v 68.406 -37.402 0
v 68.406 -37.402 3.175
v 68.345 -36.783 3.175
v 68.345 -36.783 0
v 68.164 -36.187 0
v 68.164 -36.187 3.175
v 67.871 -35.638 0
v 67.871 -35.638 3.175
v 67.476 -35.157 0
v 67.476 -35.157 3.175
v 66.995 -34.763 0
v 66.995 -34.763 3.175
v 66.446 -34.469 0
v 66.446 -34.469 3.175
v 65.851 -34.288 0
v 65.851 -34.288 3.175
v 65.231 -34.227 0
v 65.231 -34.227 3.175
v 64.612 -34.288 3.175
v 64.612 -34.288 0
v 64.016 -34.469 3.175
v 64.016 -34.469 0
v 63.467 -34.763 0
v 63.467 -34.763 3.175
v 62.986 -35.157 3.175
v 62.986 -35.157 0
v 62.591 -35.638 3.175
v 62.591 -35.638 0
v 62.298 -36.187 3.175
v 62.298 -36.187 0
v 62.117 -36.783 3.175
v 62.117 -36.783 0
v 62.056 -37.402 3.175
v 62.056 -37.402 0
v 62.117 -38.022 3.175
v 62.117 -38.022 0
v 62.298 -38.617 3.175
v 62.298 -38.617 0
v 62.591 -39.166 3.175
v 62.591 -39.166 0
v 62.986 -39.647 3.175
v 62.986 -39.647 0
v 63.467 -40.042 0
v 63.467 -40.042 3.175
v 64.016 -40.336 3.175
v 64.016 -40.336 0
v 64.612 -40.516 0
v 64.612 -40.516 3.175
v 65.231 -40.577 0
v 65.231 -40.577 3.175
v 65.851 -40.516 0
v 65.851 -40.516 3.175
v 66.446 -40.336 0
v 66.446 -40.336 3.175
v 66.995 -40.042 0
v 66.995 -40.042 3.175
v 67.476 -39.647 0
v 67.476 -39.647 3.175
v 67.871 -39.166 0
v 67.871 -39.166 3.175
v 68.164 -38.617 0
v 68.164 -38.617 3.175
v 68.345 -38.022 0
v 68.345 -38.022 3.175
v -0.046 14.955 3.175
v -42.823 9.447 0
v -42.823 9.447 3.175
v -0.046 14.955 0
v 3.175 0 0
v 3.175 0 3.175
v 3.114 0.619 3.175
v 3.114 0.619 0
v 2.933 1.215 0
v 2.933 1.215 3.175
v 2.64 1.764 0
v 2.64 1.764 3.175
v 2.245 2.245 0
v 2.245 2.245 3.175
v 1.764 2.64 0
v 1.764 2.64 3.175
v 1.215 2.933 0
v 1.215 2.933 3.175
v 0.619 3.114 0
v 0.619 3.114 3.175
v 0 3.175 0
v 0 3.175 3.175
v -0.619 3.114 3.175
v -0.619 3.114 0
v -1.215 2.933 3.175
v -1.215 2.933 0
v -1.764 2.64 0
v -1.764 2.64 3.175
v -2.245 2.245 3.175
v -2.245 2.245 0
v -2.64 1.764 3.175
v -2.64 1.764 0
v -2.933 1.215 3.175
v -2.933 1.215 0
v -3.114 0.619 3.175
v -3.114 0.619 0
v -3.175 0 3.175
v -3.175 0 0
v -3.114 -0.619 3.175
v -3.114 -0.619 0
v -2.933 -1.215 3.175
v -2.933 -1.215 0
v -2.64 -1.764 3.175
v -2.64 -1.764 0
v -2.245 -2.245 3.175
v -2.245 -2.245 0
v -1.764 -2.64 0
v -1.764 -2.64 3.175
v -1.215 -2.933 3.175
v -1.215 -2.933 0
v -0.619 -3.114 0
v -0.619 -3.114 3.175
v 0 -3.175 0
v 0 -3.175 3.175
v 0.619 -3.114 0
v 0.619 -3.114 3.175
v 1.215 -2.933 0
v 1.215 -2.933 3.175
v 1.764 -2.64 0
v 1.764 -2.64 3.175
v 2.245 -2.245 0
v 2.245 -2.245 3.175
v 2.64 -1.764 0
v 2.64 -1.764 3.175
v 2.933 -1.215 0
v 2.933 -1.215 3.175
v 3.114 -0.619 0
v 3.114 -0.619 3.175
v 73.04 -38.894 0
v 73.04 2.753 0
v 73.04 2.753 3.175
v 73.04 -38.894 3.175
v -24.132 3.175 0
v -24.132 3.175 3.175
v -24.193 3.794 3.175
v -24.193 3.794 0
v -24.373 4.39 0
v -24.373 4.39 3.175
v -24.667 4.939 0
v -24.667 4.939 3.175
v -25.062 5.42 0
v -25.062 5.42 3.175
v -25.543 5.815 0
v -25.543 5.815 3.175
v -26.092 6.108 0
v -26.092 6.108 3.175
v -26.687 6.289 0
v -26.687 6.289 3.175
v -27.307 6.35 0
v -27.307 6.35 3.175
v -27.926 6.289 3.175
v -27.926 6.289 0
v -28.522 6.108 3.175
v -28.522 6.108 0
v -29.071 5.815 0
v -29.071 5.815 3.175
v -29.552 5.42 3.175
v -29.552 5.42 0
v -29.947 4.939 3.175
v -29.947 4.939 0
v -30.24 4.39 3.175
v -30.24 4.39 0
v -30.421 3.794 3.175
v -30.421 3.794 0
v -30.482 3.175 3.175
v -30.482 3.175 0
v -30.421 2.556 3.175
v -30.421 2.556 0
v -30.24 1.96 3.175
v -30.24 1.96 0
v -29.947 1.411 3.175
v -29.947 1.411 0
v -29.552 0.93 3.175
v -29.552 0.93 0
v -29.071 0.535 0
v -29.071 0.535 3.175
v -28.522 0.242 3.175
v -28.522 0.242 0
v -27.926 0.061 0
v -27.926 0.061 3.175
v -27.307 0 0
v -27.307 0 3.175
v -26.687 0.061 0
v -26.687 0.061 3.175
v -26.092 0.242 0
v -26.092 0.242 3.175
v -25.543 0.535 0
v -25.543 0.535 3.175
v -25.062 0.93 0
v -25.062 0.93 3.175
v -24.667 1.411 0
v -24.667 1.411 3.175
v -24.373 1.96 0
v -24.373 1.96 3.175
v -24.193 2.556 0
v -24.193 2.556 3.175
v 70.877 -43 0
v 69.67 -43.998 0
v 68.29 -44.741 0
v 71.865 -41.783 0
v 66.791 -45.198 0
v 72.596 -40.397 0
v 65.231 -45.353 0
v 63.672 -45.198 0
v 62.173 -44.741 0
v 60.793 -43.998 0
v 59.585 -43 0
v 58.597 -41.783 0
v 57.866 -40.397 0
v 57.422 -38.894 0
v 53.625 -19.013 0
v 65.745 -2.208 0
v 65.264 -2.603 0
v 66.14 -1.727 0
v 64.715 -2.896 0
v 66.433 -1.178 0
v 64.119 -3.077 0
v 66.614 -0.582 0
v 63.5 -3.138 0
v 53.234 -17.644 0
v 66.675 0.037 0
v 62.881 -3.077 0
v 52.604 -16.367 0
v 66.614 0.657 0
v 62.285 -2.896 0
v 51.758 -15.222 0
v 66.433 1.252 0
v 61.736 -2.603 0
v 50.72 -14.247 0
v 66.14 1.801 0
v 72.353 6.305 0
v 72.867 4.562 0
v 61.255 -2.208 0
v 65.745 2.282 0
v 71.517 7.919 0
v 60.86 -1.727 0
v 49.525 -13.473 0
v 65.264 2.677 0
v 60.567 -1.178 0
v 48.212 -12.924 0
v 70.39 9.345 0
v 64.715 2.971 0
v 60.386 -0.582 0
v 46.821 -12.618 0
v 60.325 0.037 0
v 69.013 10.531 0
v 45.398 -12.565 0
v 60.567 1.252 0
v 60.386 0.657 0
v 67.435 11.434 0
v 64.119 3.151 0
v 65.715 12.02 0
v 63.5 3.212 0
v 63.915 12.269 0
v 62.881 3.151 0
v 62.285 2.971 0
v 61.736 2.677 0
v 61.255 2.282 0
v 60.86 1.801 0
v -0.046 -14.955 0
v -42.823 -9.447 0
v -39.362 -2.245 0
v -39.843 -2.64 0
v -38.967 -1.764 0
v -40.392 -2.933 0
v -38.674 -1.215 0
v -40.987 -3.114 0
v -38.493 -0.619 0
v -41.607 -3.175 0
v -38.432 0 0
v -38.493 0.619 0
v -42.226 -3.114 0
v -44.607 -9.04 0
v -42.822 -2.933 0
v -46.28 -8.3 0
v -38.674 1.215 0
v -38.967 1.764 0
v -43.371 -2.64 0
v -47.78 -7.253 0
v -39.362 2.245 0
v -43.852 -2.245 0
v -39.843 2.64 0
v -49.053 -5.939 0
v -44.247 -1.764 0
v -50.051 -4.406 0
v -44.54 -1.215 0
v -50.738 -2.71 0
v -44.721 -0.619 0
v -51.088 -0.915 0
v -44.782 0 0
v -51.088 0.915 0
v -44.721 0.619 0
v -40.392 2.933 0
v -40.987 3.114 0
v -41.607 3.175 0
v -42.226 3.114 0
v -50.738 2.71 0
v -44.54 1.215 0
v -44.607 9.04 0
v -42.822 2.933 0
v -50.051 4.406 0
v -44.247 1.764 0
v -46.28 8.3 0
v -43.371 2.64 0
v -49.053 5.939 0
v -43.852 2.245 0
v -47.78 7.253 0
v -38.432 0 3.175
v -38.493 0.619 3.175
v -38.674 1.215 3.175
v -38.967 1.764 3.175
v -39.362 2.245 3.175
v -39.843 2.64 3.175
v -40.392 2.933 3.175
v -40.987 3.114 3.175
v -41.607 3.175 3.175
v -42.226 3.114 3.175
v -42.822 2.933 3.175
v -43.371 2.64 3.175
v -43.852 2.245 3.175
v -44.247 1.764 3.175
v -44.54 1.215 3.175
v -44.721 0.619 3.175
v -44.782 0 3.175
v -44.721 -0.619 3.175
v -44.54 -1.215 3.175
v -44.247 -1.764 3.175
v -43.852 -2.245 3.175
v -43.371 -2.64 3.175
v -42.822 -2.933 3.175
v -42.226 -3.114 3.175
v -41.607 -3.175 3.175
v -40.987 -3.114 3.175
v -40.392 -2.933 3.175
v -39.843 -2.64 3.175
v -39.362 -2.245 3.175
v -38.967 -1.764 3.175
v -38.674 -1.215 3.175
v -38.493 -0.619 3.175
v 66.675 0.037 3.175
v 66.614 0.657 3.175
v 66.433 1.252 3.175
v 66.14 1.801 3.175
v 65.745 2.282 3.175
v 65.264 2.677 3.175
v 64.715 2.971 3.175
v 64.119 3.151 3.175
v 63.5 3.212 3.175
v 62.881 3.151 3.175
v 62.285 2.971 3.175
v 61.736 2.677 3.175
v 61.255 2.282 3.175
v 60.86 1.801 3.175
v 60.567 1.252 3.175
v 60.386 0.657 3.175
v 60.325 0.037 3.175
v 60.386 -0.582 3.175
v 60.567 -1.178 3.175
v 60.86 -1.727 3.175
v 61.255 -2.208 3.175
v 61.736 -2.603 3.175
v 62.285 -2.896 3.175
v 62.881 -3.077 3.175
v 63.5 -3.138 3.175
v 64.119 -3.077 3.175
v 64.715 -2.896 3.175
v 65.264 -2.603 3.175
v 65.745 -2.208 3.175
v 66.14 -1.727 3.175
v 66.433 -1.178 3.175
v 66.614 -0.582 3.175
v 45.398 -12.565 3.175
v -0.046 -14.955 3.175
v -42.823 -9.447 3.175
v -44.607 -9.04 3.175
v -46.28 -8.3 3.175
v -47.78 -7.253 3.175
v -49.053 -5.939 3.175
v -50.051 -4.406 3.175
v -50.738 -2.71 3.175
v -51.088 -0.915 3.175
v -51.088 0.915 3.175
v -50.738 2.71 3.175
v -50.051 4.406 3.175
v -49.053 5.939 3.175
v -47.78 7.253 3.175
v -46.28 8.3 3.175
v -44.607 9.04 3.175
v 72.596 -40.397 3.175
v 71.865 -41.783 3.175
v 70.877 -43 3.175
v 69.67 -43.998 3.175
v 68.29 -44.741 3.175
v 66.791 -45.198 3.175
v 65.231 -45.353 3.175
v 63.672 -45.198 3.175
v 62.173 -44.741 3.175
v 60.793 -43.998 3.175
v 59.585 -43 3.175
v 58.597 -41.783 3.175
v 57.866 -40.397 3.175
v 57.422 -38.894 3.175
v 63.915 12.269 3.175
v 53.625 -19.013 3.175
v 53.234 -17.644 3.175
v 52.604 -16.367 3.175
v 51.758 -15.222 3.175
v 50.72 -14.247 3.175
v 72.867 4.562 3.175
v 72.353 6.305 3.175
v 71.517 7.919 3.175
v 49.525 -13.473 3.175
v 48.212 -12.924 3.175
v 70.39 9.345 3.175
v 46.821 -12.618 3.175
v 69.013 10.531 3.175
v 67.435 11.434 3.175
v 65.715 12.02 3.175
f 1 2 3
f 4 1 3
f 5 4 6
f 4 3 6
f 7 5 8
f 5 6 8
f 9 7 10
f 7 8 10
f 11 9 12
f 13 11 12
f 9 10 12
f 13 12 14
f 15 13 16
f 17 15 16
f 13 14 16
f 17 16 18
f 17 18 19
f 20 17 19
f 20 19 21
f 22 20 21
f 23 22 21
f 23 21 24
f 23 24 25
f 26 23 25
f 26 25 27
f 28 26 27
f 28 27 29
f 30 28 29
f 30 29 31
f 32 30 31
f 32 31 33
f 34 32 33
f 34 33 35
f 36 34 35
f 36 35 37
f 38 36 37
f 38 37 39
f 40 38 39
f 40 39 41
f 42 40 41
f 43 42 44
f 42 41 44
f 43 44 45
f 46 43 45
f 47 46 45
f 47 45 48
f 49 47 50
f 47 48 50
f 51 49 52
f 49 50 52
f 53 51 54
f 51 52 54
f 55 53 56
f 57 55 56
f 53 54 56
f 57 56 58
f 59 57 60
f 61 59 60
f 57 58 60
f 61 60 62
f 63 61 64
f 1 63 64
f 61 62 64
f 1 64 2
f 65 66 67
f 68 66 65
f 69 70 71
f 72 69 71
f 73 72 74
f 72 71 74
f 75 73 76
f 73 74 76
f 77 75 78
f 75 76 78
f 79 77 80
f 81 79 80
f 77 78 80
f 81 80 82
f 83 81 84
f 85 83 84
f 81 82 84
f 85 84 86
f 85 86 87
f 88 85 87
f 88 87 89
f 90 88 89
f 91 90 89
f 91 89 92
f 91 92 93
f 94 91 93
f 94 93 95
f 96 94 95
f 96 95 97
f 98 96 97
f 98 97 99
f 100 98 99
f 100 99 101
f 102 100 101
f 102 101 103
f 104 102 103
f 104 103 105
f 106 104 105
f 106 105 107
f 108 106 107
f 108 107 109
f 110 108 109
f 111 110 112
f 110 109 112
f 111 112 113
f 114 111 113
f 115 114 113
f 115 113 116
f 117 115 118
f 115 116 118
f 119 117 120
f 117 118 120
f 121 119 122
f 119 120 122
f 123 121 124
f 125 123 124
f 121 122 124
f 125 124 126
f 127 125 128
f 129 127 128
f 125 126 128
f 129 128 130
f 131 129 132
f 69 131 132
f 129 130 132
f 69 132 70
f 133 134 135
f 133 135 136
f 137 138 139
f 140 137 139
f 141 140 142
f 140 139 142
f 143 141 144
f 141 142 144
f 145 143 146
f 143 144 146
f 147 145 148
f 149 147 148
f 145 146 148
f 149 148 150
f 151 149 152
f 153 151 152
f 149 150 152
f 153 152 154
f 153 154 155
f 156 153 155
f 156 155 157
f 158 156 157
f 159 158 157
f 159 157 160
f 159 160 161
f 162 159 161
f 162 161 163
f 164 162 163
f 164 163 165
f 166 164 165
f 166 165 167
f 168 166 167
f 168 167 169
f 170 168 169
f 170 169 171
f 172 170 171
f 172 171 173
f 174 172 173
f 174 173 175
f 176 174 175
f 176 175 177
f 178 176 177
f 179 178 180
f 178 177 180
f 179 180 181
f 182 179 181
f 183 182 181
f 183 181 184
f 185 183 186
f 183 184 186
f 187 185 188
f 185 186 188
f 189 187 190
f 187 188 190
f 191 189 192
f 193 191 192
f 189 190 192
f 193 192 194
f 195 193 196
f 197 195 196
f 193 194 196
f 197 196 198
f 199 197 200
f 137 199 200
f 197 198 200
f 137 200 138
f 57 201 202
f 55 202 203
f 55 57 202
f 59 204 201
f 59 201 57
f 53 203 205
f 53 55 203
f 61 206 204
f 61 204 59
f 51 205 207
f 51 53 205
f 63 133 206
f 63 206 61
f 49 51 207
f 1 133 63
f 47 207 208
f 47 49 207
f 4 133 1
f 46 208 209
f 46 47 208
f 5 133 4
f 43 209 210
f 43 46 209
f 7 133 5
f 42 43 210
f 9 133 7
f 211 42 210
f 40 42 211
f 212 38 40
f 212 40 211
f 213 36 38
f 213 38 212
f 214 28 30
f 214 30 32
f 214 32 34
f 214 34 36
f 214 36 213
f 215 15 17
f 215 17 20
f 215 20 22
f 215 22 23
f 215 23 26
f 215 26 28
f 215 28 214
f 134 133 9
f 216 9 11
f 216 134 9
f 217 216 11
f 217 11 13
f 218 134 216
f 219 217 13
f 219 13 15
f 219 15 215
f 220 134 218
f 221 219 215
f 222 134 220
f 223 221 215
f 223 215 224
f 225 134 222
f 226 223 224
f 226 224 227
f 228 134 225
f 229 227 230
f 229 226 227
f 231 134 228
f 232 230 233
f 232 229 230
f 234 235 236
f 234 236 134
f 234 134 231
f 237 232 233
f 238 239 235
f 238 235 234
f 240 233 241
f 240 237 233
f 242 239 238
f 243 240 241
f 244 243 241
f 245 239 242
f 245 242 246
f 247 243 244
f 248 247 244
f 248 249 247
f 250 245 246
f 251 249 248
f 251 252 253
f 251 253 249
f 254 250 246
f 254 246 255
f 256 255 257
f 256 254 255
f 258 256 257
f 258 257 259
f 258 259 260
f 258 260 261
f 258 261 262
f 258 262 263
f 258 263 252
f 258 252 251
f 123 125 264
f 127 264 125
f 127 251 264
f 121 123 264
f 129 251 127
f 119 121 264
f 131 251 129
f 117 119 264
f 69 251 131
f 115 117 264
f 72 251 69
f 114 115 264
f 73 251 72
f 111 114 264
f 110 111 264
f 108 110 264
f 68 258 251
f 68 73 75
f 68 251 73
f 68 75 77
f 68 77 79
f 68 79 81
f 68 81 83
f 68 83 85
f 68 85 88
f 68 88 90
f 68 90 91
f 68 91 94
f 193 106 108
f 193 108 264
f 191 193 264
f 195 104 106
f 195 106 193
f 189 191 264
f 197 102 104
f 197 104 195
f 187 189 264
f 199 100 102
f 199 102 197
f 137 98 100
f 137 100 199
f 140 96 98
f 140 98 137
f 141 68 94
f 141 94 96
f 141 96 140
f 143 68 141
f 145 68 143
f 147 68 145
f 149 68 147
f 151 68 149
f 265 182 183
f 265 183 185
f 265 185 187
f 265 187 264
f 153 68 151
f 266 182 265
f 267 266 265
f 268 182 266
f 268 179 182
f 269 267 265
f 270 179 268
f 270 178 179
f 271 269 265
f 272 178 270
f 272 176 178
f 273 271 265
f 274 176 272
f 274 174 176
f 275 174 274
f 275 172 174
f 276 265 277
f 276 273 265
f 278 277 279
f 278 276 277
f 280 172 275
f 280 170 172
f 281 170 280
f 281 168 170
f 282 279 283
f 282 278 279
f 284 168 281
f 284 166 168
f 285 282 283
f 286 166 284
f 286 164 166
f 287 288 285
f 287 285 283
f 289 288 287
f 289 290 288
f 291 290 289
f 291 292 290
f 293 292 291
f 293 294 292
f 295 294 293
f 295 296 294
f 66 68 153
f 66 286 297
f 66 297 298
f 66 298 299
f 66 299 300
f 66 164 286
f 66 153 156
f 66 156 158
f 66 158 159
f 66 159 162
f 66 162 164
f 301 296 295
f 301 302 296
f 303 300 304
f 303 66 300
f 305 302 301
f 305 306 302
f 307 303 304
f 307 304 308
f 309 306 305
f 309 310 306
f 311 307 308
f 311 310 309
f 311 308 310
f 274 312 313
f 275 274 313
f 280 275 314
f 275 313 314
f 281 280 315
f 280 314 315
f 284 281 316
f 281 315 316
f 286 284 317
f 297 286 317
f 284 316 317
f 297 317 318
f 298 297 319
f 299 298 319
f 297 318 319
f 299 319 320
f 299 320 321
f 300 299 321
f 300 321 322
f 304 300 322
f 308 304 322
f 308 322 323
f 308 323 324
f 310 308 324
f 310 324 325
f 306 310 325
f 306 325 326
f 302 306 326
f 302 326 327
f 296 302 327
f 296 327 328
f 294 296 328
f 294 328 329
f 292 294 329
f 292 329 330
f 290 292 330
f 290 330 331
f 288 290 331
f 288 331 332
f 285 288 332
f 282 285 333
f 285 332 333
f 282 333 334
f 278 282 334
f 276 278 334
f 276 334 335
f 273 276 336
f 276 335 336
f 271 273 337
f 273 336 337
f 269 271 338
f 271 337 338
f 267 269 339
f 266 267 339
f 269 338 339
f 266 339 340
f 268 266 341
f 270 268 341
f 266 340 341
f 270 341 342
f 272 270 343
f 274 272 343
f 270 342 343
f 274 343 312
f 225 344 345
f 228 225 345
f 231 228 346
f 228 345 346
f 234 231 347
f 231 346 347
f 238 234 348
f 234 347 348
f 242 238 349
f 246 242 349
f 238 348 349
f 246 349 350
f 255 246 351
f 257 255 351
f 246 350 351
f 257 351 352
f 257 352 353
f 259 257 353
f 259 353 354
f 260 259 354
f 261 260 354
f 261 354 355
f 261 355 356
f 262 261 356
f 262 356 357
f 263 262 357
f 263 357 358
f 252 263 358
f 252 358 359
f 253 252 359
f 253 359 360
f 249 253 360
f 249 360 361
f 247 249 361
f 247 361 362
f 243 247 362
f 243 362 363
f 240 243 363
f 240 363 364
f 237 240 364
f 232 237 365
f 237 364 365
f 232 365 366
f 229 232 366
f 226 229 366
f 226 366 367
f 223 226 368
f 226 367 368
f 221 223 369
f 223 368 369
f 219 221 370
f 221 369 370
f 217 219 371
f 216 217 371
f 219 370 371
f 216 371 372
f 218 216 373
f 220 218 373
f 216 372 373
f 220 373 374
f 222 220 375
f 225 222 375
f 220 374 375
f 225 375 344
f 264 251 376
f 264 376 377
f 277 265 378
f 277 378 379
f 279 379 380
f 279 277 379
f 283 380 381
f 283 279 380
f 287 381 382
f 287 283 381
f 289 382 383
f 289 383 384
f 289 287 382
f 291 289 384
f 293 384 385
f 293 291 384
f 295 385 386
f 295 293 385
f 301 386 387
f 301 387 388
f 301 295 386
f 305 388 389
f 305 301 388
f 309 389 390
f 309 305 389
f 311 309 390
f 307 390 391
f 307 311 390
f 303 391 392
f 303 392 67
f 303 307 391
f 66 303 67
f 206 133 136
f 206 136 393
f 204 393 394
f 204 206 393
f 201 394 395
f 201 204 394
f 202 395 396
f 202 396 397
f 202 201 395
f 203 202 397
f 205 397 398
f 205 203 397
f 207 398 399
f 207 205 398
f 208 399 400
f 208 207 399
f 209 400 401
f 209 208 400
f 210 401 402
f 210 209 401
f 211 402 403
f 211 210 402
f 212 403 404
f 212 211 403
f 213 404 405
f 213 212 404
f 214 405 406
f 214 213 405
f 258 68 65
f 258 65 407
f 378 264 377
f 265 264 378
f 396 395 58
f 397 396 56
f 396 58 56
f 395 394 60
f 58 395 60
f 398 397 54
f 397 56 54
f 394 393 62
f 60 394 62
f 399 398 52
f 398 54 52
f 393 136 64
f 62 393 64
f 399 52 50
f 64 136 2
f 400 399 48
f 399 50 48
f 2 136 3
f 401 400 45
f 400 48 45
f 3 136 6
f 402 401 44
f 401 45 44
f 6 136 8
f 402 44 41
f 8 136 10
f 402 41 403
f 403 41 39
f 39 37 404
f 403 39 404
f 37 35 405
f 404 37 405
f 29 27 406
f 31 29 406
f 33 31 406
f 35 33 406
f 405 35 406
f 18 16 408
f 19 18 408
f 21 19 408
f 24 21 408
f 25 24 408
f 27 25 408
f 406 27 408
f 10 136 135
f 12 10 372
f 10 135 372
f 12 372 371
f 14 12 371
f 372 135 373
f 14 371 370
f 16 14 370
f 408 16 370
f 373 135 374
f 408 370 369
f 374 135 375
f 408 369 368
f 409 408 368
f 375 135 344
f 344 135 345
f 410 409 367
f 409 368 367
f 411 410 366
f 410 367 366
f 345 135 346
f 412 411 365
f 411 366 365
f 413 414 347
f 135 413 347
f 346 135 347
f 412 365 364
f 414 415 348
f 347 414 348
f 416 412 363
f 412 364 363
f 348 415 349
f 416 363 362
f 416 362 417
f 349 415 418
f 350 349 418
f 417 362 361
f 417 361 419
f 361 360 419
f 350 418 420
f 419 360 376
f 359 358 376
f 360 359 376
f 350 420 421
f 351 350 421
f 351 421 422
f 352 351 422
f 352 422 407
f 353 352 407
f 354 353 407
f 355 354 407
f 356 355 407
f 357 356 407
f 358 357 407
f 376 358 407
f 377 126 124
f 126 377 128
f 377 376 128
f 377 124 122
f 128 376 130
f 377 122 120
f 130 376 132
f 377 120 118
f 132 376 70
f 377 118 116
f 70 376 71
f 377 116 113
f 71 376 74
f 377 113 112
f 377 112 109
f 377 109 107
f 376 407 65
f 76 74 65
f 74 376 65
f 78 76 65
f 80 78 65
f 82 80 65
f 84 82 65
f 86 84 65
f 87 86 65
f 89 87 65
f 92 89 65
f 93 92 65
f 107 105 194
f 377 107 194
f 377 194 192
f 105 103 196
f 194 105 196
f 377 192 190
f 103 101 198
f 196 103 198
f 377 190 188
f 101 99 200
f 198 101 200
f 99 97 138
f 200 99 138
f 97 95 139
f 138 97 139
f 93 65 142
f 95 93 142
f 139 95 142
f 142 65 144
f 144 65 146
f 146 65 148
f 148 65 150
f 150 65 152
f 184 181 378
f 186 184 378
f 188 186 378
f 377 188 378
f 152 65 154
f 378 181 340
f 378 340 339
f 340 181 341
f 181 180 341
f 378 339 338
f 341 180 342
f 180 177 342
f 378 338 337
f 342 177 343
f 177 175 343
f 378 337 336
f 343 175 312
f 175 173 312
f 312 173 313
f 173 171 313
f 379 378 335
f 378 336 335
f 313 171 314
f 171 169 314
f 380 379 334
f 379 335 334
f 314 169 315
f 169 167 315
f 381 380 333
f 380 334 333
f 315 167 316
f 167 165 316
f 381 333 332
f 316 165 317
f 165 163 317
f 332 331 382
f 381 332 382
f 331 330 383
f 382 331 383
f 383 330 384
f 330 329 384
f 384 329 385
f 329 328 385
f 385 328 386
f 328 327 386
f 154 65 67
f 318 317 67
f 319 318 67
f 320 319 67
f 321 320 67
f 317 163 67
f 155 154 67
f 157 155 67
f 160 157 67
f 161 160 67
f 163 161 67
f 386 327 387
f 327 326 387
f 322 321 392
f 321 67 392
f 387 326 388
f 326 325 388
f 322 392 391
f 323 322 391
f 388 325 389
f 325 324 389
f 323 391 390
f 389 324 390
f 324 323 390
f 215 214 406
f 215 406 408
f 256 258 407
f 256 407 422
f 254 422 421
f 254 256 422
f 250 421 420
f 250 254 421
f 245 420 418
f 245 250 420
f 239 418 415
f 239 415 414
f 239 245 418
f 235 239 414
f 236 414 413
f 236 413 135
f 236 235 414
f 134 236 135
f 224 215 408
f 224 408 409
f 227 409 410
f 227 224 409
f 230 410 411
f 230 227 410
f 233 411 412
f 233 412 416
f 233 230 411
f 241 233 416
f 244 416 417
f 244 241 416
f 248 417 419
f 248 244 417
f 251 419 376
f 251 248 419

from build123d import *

# Parameters (mm, degrees)
BOSS_EXTRUDE1_DEPTH = 3.175
SKETCH2_R           = 3.175
CUT_EXTRUDE1_DEPTH  = 87.033766175


with BuildPart() as part:
    # Sketch1 → Boss-Extrude1 (new body)
    with BuildSketch(Plane.XY):
        with BuildLine():
            Line((-42.82323198, 9.447015826), (-0.046249169, 14.954781853))
            Line((-0.046249169, 14.954781853), (63.914748375, 12.26924))
            ThreePointArc((63.914748375, 12.26924), (70.390184722, 9.345032033), (73.04017255, 2.752624837))
            Line((73.04017255, 2.752624837), (73.04017255, -38.893945713))
            ThreePointArc((73.04017255, -38.893945713), (65.231134486, -45.352634886), (57.422096421, -38.893945713))
            Line((57.422096421, -38.893945713), (53.624835968, -19.012795079))
            ThreePointArc((53.624835968, -19.012795079), (50.720085476, -14.247018679), (45.398312666, -12.56507508))
            Line((45.398312666, -12.56507508), (-0.046249169, -14.954781853))
            Line((-0.046249169, -14.954781853), (-42.82323198, -9.447015826))
            ThreePointArc((-42.82323198, -9.447015826), (-51.131878011, 0), (-42.82323198, 9.447015826))
        make_face()
    extrude(amount=BOSS_EXTRUDE1_DEPTH)

    # Sketch2 → Cut-Extrude1 (cut, through all)
    with BuildSketch(Plane.XY.offset(3.175)):
        with Locations((-41.606878011, 0)):
            Circle(SKETCH2_R)
        with Locations((-27.306678011, 3.175)):
            Circle(SKETCH2_R)
        Circle(SKETCH2_R)
        with Locations((63.5, 0.037204921)):
            Circle(SKETCH2_R)
        with Locations((65.231134486, -37.402434886)):
            Circle(SKETCH2_R)
    extrude(amount=-CUT_EXTRUDE1_DEPTH, mode=Mode.SUBTRACT)


solid = part.part
